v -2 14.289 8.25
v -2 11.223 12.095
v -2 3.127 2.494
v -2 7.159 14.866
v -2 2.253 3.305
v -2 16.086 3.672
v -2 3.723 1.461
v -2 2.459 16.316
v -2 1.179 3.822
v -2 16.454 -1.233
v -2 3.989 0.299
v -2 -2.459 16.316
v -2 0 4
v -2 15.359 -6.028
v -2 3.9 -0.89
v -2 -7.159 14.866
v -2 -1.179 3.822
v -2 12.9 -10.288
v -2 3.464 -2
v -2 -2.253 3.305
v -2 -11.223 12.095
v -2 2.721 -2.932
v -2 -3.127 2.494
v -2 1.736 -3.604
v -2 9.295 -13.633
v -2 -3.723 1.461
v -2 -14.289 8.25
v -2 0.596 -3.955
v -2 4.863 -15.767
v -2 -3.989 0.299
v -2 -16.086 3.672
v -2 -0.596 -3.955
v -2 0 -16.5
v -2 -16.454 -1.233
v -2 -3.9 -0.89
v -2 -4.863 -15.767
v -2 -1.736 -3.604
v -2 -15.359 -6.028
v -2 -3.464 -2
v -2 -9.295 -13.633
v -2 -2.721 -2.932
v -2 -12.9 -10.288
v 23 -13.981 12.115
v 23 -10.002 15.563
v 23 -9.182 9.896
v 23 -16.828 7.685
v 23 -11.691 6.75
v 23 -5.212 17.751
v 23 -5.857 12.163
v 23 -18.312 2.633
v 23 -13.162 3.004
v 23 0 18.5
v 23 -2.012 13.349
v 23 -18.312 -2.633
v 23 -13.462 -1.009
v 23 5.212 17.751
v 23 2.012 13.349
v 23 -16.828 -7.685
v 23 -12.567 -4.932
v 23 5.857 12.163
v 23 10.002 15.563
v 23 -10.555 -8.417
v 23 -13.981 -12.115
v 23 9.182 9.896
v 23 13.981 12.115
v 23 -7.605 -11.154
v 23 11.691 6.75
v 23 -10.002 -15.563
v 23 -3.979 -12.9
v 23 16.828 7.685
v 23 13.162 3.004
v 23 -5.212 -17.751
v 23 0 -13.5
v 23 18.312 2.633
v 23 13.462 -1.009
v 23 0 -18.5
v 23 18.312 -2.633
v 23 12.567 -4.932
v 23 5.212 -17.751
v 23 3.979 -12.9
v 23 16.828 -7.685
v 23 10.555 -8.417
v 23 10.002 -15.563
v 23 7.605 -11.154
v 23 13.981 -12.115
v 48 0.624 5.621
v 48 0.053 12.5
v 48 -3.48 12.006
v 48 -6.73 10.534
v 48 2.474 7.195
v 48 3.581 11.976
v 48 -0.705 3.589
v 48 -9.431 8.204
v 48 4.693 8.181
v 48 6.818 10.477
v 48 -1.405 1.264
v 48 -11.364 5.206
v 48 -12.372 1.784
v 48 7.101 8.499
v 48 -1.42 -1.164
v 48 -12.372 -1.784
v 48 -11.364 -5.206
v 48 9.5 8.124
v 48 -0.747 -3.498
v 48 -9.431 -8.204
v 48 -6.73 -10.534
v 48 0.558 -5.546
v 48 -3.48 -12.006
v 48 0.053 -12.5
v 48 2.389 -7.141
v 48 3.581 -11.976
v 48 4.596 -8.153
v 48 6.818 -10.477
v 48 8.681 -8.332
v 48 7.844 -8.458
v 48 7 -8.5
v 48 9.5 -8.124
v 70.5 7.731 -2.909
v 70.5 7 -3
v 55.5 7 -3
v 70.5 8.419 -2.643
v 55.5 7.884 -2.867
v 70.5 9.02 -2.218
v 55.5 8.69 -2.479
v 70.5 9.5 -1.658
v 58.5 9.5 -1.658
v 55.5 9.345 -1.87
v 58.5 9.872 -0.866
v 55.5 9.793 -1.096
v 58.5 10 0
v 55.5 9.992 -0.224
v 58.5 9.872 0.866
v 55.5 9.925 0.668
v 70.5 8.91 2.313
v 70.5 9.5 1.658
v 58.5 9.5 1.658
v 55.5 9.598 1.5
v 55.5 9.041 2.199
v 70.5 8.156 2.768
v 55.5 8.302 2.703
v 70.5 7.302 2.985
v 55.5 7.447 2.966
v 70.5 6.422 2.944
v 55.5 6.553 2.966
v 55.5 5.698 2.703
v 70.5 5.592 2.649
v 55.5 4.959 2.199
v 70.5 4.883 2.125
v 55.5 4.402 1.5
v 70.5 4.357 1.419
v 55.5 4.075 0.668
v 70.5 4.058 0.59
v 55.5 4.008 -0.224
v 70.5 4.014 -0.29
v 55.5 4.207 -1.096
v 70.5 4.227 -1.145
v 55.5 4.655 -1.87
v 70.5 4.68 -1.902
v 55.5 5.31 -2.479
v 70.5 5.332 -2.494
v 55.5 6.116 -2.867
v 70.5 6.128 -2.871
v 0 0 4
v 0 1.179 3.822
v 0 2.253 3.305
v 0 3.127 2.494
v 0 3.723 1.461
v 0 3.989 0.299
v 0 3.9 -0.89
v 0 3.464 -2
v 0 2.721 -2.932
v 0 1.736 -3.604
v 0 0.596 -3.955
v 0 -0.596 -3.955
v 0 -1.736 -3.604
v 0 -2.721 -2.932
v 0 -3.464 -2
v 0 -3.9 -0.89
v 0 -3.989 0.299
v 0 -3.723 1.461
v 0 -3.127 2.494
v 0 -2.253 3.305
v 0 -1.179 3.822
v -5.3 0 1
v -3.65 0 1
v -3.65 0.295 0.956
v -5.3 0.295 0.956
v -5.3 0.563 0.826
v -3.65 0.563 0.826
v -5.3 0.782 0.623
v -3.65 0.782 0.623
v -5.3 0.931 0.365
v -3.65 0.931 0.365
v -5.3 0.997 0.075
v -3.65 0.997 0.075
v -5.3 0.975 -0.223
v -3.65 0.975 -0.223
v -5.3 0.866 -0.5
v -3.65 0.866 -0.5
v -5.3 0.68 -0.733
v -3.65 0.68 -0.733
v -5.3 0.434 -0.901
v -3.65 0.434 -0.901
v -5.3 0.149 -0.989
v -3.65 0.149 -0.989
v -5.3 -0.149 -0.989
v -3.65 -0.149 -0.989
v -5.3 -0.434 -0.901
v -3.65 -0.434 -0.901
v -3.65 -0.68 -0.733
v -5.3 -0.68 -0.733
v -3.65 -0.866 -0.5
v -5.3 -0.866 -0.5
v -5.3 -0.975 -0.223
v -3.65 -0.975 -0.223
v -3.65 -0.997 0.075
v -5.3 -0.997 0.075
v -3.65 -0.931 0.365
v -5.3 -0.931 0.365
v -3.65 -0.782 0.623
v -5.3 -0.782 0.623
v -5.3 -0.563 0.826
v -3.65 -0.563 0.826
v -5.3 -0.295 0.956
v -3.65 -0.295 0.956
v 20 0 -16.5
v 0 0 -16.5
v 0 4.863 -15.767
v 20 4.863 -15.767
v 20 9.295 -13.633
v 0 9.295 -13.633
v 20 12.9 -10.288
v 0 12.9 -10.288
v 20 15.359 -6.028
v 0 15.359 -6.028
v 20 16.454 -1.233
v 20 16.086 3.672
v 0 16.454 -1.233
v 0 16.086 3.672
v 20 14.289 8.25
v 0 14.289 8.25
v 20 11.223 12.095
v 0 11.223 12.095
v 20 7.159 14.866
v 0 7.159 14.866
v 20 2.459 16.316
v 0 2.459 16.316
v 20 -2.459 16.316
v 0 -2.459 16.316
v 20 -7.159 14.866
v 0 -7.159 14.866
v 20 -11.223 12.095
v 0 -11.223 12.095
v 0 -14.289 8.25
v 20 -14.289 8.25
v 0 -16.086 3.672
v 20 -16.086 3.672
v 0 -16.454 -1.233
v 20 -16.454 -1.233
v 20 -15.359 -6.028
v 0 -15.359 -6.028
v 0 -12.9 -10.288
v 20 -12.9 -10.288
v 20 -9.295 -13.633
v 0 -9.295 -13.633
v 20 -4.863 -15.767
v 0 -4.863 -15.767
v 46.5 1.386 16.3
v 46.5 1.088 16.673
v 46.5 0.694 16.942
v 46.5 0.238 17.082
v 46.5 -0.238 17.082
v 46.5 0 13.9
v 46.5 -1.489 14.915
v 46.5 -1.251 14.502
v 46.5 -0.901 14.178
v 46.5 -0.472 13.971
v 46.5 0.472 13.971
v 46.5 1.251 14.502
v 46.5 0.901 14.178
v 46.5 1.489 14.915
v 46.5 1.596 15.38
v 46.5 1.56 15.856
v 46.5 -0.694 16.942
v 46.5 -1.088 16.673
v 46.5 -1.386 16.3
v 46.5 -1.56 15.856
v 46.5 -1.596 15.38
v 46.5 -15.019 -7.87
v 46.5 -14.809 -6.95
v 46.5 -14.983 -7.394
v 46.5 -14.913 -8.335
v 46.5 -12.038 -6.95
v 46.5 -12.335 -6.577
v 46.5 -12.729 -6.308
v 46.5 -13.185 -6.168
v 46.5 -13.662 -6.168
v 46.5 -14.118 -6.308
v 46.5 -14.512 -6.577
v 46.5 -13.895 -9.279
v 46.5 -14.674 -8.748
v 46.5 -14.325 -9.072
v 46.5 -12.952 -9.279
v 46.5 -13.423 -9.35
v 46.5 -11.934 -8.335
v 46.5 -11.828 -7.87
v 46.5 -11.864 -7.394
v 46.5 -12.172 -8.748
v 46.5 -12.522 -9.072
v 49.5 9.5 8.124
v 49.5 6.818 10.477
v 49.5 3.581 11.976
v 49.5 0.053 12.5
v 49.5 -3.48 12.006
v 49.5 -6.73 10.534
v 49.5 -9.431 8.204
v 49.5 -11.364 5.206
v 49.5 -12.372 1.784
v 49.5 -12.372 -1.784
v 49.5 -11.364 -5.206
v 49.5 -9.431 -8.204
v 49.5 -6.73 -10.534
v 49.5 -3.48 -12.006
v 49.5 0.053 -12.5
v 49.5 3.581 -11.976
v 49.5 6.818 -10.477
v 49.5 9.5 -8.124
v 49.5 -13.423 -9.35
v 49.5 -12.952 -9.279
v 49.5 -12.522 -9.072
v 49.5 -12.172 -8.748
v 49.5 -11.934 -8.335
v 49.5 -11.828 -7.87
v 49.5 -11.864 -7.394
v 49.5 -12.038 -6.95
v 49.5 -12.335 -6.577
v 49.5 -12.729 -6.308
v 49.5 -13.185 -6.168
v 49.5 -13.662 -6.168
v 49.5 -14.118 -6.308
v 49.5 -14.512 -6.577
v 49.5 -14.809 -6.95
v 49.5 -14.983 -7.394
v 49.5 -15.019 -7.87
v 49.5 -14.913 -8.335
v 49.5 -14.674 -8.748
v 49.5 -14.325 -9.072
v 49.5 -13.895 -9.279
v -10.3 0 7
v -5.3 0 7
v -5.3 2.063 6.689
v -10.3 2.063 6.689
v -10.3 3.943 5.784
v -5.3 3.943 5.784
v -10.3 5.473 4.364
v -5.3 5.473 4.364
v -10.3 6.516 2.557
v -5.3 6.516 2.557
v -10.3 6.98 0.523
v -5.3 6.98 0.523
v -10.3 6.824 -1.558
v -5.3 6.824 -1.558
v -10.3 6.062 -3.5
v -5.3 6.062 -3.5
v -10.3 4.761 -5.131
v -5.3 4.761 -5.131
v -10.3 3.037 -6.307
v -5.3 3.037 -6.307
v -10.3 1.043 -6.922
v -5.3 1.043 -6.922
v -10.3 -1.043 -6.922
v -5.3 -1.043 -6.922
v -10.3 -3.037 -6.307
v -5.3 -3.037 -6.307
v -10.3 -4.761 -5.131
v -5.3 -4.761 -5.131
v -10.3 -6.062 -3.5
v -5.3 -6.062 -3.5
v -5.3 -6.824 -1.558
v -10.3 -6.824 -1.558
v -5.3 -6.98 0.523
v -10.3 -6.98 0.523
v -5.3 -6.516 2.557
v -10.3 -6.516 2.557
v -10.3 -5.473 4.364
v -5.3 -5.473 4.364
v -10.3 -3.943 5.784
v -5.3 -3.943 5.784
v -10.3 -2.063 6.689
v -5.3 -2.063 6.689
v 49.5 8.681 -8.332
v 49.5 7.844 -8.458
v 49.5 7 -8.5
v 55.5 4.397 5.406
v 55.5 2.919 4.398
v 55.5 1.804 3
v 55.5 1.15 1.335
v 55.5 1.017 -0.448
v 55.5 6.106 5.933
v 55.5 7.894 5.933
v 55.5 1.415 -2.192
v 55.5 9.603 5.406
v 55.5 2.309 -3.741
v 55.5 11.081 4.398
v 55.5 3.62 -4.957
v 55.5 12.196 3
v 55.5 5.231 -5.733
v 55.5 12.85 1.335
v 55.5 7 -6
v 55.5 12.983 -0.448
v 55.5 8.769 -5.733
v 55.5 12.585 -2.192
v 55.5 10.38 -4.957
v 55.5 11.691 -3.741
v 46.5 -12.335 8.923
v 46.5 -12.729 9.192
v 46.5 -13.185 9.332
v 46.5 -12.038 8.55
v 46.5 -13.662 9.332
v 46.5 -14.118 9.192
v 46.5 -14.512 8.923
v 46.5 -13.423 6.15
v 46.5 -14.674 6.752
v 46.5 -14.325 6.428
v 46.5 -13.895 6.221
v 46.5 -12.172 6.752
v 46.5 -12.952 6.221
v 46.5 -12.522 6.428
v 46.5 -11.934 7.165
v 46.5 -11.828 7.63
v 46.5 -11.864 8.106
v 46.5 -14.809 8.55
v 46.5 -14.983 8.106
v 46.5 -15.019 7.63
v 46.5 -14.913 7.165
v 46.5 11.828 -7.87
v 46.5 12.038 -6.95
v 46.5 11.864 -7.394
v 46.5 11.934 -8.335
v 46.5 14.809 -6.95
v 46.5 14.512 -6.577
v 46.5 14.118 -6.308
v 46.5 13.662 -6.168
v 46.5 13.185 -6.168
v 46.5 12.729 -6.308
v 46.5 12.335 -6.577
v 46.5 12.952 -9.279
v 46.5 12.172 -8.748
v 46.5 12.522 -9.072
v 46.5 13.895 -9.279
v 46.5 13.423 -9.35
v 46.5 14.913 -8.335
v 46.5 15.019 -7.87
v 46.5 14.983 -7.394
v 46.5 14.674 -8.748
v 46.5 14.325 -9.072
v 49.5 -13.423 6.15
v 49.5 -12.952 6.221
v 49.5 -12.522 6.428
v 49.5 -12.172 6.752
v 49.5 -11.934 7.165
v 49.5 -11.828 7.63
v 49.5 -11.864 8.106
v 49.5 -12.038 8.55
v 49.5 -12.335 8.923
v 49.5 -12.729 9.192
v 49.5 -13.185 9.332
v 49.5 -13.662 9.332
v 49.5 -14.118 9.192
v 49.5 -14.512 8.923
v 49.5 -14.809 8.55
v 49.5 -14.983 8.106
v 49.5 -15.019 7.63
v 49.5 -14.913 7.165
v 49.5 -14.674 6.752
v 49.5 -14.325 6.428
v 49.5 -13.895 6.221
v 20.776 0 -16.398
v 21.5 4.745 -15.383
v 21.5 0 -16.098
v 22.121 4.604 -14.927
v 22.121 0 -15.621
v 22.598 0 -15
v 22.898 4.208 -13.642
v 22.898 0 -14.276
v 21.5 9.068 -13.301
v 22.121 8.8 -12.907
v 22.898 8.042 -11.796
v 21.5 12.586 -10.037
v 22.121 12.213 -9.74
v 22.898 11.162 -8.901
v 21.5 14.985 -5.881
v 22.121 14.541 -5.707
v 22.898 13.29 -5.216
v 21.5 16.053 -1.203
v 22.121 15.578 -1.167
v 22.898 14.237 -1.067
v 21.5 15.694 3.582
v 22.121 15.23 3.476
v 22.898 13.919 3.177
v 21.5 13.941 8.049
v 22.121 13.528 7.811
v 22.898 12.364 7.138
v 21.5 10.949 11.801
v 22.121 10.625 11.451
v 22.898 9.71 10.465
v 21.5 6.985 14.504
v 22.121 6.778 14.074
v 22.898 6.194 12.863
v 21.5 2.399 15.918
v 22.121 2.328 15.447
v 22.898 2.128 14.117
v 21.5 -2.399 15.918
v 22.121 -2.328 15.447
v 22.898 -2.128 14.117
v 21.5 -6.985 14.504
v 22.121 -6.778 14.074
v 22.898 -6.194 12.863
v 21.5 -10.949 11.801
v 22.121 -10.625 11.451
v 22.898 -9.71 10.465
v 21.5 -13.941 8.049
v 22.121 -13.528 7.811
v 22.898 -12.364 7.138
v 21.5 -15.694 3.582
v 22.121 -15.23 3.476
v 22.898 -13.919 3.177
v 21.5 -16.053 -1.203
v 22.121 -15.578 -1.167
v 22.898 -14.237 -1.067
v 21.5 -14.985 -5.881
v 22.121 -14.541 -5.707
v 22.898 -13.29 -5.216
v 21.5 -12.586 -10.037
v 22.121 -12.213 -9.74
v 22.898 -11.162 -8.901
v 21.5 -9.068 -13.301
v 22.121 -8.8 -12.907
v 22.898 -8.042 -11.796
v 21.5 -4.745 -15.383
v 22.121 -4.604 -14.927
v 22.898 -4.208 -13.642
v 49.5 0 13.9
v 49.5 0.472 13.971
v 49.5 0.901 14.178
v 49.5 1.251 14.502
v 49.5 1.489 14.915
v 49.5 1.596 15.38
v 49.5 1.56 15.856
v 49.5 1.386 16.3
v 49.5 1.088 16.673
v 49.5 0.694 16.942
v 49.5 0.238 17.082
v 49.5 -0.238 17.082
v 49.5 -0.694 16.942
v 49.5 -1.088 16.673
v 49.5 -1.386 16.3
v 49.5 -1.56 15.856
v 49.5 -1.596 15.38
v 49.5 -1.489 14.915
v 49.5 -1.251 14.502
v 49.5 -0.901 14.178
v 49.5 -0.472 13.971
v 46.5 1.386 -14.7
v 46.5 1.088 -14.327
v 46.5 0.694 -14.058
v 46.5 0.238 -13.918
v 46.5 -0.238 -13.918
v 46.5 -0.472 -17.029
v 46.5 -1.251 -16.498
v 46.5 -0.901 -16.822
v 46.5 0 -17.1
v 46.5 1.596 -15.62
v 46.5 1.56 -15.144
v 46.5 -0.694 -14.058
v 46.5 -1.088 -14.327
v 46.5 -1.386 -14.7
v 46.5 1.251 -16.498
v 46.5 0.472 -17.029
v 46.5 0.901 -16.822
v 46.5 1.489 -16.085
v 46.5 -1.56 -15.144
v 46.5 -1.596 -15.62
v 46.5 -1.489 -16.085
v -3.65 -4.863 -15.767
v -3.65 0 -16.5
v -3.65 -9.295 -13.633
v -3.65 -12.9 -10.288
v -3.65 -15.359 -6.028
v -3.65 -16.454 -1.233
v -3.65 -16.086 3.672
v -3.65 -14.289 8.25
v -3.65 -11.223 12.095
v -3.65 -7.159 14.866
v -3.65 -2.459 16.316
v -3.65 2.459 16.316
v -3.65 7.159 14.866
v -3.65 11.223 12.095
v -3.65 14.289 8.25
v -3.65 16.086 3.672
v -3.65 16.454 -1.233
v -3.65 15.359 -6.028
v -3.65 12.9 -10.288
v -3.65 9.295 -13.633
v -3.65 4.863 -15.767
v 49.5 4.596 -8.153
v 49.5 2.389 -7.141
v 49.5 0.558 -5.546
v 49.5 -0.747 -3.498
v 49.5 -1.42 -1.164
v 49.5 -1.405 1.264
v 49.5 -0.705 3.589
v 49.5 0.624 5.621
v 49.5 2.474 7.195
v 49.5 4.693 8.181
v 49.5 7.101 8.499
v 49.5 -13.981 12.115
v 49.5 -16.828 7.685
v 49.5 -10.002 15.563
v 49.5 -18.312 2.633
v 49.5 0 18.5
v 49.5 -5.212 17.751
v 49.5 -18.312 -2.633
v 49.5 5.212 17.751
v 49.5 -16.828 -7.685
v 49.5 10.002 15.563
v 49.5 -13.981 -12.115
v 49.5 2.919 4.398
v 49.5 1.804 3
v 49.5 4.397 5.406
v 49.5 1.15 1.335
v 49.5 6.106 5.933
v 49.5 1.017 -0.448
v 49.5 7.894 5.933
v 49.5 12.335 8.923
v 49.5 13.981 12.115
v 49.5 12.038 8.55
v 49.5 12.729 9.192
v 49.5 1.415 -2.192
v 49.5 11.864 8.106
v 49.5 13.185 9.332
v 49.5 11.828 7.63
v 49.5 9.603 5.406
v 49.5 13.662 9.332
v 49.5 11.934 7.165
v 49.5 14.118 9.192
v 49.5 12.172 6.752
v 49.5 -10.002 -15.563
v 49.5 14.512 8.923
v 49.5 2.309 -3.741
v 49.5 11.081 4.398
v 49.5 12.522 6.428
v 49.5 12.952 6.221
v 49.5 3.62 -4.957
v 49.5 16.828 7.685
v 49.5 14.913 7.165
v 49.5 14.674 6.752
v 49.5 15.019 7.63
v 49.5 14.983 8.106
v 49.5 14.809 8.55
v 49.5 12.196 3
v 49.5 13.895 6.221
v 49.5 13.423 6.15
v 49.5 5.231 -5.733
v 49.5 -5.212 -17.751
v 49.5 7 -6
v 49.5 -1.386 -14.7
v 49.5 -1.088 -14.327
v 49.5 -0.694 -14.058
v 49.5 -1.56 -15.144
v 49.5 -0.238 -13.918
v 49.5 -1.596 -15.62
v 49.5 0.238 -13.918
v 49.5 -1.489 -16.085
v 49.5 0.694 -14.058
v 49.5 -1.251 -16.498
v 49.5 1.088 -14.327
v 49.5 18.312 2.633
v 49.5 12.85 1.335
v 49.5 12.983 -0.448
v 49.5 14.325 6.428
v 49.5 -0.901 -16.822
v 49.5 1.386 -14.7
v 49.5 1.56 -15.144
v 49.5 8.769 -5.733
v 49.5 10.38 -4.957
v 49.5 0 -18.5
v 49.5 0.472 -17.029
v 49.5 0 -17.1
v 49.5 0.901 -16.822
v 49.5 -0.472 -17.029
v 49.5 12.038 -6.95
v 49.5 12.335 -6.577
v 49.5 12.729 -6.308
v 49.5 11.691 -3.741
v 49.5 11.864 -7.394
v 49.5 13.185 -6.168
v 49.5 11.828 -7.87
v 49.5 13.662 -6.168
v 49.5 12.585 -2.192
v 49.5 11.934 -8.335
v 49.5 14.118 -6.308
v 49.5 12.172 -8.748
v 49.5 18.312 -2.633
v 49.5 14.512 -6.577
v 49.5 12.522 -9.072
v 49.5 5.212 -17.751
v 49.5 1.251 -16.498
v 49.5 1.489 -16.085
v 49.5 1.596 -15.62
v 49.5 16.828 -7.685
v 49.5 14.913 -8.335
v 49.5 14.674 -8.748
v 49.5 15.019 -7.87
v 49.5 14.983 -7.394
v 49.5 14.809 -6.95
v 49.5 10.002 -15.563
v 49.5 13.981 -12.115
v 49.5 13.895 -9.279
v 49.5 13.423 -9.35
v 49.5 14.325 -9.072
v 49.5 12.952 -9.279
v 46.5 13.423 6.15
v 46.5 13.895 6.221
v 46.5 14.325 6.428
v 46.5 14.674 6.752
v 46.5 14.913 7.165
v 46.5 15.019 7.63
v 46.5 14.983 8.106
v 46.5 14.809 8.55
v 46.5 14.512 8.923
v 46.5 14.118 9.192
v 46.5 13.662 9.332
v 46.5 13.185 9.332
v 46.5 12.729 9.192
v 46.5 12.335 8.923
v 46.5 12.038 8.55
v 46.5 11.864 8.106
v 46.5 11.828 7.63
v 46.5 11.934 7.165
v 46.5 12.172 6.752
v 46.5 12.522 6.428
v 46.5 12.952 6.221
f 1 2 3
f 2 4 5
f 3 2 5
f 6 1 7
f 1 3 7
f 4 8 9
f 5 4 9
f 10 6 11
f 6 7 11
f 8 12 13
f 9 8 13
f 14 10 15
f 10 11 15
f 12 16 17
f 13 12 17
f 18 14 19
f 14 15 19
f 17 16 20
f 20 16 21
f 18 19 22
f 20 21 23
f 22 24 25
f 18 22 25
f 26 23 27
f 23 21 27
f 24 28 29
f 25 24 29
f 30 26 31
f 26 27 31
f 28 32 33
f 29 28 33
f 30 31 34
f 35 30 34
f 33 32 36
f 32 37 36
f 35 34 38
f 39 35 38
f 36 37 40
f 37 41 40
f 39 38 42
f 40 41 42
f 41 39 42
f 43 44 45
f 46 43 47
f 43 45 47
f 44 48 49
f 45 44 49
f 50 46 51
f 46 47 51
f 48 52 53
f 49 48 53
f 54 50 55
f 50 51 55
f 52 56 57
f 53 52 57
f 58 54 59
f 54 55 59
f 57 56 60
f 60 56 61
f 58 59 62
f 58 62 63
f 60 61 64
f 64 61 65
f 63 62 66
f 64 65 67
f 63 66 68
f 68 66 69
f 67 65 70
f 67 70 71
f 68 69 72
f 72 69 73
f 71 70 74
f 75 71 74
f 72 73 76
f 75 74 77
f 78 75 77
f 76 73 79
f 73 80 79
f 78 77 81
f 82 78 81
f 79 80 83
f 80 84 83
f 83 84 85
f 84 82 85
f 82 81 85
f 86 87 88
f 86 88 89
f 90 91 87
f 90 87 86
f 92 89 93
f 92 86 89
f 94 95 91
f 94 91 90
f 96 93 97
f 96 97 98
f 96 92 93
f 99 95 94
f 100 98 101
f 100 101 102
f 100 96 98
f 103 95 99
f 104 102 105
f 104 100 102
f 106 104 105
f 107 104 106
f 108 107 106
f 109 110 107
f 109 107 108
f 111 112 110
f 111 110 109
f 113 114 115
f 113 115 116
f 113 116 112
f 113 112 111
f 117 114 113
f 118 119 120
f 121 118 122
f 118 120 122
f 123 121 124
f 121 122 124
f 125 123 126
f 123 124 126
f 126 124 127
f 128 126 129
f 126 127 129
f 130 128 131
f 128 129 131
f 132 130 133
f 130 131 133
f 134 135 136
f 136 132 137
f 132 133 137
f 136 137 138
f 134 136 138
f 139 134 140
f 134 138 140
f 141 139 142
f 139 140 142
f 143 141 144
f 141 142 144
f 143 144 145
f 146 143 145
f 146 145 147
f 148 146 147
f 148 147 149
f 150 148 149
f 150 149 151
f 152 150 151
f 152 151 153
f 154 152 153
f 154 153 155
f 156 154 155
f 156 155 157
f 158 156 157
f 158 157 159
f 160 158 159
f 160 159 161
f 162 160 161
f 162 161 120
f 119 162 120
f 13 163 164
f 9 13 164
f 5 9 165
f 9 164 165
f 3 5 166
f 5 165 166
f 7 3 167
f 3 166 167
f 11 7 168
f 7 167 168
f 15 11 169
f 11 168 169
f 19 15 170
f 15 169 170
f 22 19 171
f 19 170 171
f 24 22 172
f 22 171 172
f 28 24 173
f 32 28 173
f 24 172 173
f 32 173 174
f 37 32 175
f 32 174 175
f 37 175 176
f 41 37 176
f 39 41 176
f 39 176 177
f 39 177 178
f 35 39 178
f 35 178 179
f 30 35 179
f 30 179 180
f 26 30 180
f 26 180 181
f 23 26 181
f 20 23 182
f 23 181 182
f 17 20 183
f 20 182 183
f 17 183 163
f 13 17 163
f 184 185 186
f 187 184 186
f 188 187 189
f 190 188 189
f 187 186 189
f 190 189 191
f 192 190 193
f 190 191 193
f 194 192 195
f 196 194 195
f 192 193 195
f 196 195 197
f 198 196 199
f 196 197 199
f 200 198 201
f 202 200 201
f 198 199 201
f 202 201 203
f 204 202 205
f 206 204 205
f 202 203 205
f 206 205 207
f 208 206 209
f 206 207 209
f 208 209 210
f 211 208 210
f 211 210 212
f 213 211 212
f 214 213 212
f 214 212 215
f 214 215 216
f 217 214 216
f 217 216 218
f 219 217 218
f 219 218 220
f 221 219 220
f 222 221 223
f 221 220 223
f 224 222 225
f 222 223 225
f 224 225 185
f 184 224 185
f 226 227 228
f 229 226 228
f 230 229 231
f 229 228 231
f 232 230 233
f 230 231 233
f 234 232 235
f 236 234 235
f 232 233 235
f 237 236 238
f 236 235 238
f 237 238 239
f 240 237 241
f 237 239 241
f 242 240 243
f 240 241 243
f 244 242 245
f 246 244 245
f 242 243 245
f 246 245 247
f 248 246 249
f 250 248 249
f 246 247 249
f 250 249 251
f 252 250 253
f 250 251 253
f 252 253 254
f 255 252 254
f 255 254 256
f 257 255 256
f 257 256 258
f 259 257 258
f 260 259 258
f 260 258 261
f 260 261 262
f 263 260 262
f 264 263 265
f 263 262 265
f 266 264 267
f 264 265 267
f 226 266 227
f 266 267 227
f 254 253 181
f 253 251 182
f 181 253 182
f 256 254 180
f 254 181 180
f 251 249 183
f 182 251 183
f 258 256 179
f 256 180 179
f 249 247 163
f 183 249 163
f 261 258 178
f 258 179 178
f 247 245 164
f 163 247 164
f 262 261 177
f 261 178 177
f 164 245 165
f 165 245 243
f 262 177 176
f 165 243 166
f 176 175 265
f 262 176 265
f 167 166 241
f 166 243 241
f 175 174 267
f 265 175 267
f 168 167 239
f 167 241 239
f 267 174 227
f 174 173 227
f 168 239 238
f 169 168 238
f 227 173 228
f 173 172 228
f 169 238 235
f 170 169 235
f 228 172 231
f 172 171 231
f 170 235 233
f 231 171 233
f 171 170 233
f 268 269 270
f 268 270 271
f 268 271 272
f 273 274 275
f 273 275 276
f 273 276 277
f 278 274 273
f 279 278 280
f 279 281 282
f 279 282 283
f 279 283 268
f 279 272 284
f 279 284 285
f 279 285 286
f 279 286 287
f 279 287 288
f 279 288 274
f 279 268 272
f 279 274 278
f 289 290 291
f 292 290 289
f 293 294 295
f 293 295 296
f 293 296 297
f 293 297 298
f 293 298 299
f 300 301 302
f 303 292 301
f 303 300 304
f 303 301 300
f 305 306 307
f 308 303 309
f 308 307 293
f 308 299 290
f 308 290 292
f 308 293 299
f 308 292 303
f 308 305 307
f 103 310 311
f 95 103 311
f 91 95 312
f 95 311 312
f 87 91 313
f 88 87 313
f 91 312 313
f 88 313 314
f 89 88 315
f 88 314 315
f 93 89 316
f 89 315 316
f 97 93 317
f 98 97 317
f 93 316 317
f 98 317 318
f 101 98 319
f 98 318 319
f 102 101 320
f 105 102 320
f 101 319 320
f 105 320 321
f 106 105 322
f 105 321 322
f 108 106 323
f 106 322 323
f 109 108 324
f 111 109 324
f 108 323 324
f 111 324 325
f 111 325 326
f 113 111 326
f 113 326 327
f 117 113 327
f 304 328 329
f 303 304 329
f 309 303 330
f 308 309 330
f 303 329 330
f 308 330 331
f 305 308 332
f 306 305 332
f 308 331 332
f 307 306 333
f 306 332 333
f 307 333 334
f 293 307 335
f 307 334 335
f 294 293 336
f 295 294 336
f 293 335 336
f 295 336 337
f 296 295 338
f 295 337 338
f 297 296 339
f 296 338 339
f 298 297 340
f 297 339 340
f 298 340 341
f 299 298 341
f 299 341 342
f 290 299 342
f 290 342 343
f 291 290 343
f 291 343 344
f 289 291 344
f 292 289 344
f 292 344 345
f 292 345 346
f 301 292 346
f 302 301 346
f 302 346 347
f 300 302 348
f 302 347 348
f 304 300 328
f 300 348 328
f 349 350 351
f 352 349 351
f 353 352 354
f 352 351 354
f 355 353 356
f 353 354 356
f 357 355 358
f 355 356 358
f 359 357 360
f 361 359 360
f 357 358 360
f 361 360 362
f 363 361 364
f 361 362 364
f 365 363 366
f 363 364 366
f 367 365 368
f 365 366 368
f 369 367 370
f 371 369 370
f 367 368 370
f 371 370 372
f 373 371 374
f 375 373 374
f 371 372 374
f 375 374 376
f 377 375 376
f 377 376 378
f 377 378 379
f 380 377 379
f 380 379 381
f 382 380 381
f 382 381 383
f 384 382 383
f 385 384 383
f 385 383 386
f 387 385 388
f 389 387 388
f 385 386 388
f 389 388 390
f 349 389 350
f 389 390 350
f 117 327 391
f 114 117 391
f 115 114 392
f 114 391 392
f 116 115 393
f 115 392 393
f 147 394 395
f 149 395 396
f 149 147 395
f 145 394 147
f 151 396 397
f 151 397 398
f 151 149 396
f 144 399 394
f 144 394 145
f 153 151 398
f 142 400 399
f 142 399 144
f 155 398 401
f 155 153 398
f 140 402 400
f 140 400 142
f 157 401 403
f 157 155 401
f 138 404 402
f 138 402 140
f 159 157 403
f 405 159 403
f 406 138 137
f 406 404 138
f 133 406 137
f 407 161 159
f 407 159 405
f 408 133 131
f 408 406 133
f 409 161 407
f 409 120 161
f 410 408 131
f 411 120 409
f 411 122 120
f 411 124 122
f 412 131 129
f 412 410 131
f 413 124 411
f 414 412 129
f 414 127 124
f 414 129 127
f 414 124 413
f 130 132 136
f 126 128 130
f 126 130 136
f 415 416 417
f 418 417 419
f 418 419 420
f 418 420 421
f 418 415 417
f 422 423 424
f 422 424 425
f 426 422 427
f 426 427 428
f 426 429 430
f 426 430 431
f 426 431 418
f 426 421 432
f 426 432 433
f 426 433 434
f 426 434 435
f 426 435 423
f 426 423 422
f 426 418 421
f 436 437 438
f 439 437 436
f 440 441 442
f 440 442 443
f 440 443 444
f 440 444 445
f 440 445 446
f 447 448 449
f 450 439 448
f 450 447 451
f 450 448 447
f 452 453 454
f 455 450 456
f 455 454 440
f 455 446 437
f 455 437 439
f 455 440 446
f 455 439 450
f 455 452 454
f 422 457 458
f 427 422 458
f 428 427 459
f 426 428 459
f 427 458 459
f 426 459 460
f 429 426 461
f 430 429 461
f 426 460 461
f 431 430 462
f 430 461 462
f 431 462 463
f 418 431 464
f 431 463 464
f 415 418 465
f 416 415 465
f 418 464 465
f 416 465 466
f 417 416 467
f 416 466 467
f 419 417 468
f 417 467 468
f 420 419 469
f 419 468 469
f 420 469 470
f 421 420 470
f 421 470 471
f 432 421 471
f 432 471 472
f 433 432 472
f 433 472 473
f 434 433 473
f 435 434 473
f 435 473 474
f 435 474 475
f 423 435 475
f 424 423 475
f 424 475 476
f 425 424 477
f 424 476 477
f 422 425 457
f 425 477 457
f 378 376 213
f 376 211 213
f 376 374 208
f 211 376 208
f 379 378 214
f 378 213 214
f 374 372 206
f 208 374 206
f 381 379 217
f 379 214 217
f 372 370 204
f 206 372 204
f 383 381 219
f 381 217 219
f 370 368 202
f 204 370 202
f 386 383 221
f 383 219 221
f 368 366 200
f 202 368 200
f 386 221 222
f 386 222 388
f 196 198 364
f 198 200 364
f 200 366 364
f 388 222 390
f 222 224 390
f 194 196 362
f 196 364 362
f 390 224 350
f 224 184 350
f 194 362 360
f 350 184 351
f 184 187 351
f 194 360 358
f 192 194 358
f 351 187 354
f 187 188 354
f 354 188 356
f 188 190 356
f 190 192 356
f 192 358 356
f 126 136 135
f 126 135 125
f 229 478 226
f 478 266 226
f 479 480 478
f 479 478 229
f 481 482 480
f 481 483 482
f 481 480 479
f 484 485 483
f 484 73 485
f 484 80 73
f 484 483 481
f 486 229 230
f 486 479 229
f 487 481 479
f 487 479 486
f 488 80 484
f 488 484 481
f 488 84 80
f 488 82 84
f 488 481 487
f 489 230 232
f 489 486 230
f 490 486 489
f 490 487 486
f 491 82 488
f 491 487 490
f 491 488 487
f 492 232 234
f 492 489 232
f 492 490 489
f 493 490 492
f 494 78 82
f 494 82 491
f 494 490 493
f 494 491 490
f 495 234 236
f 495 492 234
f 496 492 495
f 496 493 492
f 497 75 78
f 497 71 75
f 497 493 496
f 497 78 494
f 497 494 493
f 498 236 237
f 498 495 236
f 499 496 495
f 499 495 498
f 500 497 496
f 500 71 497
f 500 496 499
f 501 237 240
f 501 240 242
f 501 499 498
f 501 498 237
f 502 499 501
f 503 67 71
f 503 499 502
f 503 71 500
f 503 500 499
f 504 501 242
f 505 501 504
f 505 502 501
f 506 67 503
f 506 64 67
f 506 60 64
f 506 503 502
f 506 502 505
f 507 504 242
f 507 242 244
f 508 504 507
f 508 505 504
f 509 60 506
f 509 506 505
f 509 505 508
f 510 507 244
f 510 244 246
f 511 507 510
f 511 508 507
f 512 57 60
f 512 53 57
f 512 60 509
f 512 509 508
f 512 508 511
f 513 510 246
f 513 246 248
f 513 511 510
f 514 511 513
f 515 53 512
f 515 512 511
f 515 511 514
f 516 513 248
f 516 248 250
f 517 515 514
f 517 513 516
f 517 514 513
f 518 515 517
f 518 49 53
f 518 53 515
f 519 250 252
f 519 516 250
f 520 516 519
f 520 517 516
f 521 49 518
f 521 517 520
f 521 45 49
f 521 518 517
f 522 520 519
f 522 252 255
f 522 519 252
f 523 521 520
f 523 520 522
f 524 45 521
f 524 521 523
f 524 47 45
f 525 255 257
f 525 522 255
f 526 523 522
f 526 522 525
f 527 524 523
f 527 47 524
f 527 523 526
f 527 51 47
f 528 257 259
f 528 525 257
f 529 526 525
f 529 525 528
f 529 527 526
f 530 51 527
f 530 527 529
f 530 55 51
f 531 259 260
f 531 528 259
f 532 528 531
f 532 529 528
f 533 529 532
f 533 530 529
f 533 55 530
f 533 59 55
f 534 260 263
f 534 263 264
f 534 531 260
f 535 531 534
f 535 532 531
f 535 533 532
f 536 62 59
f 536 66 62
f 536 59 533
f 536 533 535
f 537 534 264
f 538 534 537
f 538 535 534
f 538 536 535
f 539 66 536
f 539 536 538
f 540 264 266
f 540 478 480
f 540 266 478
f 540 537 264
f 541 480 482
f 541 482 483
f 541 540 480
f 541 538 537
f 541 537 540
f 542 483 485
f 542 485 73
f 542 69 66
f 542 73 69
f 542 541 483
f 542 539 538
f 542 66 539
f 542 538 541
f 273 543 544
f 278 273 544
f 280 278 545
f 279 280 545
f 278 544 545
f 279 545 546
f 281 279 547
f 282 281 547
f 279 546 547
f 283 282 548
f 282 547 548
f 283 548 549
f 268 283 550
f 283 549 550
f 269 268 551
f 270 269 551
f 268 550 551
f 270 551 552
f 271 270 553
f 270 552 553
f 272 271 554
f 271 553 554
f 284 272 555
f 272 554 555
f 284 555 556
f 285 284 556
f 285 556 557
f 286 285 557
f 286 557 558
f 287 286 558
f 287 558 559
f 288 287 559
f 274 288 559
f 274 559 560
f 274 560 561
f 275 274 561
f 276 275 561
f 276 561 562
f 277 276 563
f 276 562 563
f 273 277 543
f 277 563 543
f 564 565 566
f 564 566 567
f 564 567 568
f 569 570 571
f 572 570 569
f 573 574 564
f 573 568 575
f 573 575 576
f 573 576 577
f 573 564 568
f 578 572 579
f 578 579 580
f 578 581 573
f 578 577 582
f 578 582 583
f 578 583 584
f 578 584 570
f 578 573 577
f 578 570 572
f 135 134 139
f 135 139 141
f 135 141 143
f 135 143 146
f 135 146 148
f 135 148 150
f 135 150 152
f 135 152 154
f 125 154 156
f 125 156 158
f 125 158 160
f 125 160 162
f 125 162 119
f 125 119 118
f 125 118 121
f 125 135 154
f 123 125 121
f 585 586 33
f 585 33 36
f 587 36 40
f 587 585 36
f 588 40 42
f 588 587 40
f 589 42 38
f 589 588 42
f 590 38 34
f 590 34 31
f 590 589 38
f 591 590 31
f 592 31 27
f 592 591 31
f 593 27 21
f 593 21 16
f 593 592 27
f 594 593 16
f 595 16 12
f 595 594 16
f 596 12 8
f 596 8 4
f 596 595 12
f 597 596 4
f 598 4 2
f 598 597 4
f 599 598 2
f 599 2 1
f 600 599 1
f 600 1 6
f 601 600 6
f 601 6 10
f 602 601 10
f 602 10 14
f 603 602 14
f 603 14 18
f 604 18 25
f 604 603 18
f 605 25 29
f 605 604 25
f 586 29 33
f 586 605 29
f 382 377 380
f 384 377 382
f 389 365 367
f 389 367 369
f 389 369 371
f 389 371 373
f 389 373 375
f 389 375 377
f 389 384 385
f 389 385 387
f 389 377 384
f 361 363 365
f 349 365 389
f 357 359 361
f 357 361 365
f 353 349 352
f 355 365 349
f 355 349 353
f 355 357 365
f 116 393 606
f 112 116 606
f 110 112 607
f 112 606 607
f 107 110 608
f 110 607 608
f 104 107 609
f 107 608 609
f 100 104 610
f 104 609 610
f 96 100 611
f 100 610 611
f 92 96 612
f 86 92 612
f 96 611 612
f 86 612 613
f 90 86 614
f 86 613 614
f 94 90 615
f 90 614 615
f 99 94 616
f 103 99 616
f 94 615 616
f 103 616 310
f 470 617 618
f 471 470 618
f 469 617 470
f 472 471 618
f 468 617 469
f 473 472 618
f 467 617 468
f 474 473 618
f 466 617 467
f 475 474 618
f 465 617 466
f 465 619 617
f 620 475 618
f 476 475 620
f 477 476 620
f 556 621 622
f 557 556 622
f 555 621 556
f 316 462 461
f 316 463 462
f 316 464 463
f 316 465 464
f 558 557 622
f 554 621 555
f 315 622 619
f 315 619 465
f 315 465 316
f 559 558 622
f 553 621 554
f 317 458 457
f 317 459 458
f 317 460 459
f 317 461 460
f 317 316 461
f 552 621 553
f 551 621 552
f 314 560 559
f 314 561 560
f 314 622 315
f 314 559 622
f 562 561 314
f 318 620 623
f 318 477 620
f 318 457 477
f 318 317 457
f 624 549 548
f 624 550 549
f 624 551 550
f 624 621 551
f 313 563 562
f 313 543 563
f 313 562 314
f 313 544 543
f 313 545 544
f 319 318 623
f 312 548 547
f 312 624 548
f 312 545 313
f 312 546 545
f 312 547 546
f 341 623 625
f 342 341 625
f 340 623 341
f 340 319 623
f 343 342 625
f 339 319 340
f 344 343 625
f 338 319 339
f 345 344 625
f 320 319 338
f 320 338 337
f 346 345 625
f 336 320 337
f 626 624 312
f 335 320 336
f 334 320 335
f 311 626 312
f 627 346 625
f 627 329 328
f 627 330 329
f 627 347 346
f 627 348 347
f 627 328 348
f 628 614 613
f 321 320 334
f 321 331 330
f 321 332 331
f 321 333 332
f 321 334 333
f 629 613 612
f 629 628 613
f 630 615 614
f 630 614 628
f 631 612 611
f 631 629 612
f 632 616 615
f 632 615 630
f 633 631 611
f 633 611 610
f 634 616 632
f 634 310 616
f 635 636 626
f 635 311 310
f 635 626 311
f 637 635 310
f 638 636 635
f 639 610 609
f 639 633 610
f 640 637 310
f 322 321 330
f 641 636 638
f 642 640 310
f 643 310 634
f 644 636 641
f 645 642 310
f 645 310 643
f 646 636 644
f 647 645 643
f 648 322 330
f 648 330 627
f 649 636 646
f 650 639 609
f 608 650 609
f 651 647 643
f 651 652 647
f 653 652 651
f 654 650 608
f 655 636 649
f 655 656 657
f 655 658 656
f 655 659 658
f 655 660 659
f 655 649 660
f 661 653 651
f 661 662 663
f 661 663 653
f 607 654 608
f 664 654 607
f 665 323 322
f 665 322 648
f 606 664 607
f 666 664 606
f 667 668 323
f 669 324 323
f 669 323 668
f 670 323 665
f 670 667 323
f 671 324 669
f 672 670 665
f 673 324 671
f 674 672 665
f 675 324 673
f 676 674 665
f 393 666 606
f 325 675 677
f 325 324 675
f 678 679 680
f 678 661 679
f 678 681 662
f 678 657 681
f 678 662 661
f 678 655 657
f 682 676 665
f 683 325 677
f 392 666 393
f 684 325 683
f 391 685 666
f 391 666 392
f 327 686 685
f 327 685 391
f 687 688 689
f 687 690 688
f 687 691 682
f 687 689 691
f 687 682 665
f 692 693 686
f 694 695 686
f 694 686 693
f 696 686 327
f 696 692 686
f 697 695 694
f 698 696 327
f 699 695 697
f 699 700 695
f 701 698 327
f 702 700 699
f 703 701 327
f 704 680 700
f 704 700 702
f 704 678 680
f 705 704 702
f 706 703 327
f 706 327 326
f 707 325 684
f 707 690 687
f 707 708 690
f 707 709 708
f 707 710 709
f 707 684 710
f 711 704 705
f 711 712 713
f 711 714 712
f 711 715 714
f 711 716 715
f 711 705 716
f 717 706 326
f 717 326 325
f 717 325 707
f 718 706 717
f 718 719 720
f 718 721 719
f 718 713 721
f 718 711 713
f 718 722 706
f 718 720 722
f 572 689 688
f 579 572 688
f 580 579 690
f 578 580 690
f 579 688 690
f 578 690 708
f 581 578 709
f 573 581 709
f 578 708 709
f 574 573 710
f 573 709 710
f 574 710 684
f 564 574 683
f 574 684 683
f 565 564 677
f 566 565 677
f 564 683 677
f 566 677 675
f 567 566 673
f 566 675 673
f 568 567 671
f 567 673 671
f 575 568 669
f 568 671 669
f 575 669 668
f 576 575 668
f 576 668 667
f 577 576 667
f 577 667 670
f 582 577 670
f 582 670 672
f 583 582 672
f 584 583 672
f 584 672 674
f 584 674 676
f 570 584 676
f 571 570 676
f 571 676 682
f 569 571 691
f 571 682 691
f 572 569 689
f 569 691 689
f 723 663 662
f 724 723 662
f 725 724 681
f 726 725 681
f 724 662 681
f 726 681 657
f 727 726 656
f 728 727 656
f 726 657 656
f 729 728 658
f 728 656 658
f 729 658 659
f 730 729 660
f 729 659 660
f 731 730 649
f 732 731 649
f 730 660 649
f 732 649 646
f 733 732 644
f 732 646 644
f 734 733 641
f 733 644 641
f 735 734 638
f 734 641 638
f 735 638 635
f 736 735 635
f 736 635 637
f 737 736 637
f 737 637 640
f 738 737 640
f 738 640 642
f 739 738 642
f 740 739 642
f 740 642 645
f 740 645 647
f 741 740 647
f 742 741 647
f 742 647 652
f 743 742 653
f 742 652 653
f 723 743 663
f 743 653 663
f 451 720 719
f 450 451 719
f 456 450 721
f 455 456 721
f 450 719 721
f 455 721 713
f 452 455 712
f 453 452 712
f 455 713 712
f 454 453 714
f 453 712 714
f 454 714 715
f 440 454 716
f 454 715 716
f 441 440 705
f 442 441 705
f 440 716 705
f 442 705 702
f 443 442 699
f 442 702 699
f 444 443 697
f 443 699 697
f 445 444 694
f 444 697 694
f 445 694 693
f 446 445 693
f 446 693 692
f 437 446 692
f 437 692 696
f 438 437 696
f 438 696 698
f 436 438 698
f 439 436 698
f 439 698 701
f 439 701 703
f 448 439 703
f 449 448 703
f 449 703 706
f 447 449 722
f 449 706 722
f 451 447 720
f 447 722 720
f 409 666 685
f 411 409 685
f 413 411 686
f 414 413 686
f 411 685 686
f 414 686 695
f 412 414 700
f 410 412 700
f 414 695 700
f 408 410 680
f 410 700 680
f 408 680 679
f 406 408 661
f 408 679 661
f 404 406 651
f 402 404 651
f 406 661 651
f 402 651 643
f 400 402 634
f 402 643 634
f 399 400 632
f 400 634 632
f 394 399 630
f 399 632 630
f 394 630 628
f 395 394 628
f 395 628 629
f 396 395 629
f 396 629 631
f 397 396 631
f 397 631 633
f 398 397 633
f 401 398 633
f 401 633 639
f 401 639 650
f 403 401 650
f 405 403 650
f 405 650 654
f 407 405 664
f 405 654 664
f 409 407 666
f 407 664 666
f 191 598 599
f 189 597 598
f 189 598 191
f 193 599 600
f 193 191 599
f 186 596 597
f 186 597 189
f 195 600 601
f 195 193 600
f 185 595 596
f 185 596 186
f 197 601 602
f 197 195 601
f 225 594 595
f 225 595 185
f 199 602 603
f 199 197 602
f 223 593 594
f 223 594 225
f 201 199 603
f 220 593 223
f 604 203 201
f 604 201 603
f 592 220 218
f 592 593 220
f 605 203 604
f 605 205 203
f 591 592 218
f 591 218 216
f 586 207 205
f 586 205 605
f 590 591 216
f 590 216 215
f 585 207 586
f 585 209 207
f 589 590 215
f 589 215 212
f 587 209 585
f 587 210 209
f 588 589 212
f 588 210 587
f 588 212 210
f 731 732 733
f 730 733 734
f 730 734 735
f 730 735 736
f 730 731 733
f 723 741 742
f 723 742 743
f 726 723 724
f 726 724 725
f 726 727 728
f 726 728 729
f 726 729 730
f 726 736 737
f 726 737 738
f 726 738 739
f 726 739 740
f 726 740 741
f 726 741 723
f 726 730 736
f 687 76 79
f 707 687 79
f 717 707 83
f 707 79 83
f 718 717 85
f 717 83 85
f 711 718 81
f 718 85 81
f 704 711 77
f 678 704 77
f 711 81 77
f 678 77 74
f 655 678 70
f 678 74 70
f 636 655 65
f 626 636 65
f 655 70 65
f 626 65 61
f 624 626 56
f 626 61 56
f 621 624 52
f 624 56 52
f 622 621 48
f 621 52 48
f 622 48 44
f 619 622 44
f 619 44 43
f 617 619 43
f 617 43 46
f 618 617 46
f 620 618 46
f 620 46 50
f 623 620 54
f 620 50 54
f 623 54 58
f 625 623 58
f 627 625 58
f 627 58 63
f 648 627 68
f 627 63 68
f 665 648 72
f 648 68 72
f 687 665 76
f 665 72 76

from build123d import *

# Parameters (mm, degrees)
CROQUIS_MOTOR_BASE_R      = 16.5
SALIENTE_EXTRUIR1_DEPTH   = 23
REDONDEO1_R               = 3
CROQUIS_REDUCTOR_BASE_R   = 18.5
SALIENTE_EXTRUIR2_DEPTH   = 26.5
CROQUIS_MOTOR_SHAFT_R     = 6
SALIENTE_EXTRUIR3_DEPTH   = 6
CORTAR_EXTRUIR1_DEPTH     = 1.5
CROQUIS_SHAFT_R           = 3
SALIENTE_EXTRUIR4_DEPTH   = 15
CORTAR_EXTRUIR2_START     = -12
CORTAR_EXTRUIR2_DEPTH     = 12
CROQUIS_MOUNT_AND_CLOSE_R = 1.6
CORTAR_EXTRUIR3_DEPTH     = 3
CROQUIS_MOTOR_SHAFT_OUT_R = 4
SALIENTE_EXTRUIR5_DEPTH   = 2
SALIENTE_EXTRUIR6_START   = 1.65
CROQUIS_ELECTRONICS_R     = 16.5
SALIENTE_EXTRUIR6_DEPTH   = 1.65
CROQUIS_MOTOR_AXIS_R      = 1
SALIENTE_EXTRUIR7_DEPTH   = 1.65
CROQUIS_ENCODER_R         = 7
SALIENTE_EXTRUIR8_DEPTH   = 5


with BuildPart() as part:
    # Croquis motor base → Saliente-Extruir1 (new body)
    with BuildSketch(Plane(origin=(0, 0, 0), x_dir=(0, 0, -1), z_dir=(1, 0, 0))):
        Circle(CROQUIS_MOTOR_BASE_R)
    extrude(amount=SALIENTE_EXTRUIR1_DEPTH)

    # Redondeo1
    redondeo1_edges = [part.edges().sort_by_distance(p)[0] for p in [
        (23, 0, 16.5),
    ]]
    fillet(redondeo1_edges, radius=REDONDEO1_R)

    # Croquis reductor base → Saliente-Extruir2 (add)
    with BuildSketch(Plane(origin=(23, 0, 0), x_dir=(0, 0, -1), z_dir=(1, 0, 0))):
        Circle(CROQUIS_REDUCTOR_BASE_R)
    extrude(amount=SALIENTE_EXTRUIR2_DEPTH)

    # Croquis motor shaft → Saliente-Extruir3 (add)
    with BuildSketch(Plane(origin=(49.5, 0, 0), x_dir=(0, 0, -1), z_dir=(1, 0, 0))):
        with Locations((0, 7)):
            Circle(CROQUIS_MOTOR_SHAFT_R)
    extrude(amount=SALIENTE_EXTRUIR3_DEPTH)

    # Croquis motor shaft<3> → Cortar-Extruir1 (cut)
    with BuildSketch(Plane(origin=(49.5, 0, 0), x_dir=(0, 0, -1), z_dir=(1, 0, 0))):
        with BuildLine():
            ThreePointArc((8.124038405, 9.5), (8.405484116, 8.264055687), (8.5, 7))
            ThreePointArc((8.5, 7), (-1.264055687, -1.405484116), (-8.124038405, 9.5))
            ThreePointArc((-8.124038405, 9.5), (0, -12.5), (8.124038405, 9.5))
        make_face()
    extrude(amount=-CORTAR_EXTRUIR1_DEPTH, mode=Mode.SUBTRACT)

    # Croquis shaft → Saliente-Extruir4 (add)
    with BuildSketch(Plane(origin=(55.5, 0, 0), x_dir=(0, 0, -1), z_dir=(1, 0, 0))):
        with Locations((0, 7)):
            Circle(CROQUIS_SHAFT_R)
    extrude(amount=SALIENTE_EXTRUIR4_DEPTH)

    # Croquis shaft lock → Cortar-Extruir2 (cut)
    with BuildSketch(Plane(origin=(70.5, 0, 0), x_dir=(0, 0, -1), z_dir=(1, 0, 0)).offset(CORTAR_EXTRUIR2_START)):
        with BuildLine():
            Line((-1.658312395, 9.5), (1.658312395, 9.5))
            ThreePointArc((1.658312395, 9.5), (0, 10), (-1.658312395, 9.5))
        make_face()
    extrude(amount=CORTAR_EXTRUIR2_DEPTH, mode=Mode.SUBTRACT)

    # Croquis mount and close → Cortar-Extruir3 (cut)
    with BuildSketch(Plane(origin=(49.5, 0, 0), x_dir=(0, 0, -1), z_dir=(1, 0, 0))):
        with Locations((-15.5, 0)):
            Circle(CROQUIS_MOUNT_AND_CLOSE_R)
        with Locations((-7.75, 13.423393759)):
            Circle(CROQUIS_MOUNT_AND_CLOSE_R)
        with Locations((7.75, 13.423393759)):
            Circle(CROQUIS_MOUNT_AND_CLOSE_R)
        with Locations((15.5, 0)):
            Circle(CROQUIS_MOUNT_AND_CLOSE_R)
        with Locations((7.75, -13.423393759)):
            Circle(CROQUIS_MOUNT_AND_CLOSE_R)
        with Locations((-7.75, -13.423393759)):
            Circle(CROQUIS_MOUNT_AND_CLOSE_R)
    extrude(amount=-CORTAR_EXTRUIR3_DEPTH, mode=Mode.SUBTRACT)

    # Croquis motor shaft out → Saliente-Extruir5 (add)
    with BuildSketch(Plane.ZY):
        Circle(CROQUIS_MOTOR_SHAFT_OUT_R)
    extrude(amount=SALIENTE_EXTRUIR5_DEPTH)

    # Croquis electronics → Saliente-Extruir6 (add)
    with BuildSketch(Plane.ZY.offset(2).offset(SALIENTE_EXTRUIR6_START)):
        Circle(CROQUIS_ELECTRONICS_R)
    extrude(amount=-SALIENTE_EXTRUIR6_DEPTH)

    # Croquis motor axis → Saliente-Extruir7 (add)
    with BuildSketch(Plane.ZY.offset(3.65)):
        Circle(CROQUIS_MOTOR_AXIS_R)
    extrude(amount=SALIENTE_EXTRUIR7_DEPTH)

    # Croquis encoder → Saliente-Extruir8 (add)
    with BuildSketch(Plane.ZY.offset(5.3)):
        Circle(CROQUIS_ENCODER_R)
    extrude(amount=SALIENTE_EXTRUIR8_DEPTH)


solid = part.part
